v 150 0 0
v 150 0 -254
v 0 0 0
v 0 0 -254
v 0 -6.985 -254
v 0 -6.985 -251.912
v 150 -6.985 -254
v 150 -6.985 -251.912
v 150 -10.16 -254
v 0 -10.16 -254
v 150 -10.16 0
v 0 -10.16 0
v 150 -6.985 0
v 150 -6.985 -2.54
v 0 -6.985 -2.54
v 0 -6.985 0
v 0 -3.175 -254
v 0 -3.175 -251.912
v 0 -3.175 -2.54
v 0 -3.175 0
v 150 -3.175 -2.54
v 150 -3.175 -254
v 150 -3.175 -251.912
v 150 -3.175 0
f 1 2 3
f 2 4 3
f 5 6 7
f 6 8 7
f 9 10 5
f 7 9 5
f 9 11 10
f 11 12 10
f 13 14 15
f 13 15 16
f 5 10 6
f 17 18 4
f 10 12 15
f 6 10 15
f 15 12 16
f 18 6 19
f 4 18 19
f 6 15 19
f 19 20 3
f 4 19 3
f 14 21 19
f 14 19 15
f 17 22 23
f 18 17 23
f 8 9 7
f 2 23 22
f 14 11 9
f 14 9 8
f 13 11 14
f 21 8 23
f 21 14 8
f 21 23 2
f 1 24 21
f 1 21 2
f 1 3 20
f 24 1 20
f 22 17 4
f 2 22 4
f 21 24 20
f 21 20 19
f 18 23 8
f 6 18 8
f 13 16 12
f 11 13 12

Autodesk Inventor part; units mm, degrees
ref_plane "YZ Plane" through (0, 0, 0) normal (1, 0, 0) x (0, 1, 0)
ref_plane "XZ Plane" through (0, 0, 0) normal (0, 1, 0) x (-1, 0, 0)
ref_plane "XY Plane" through (0, 0, 0) normal (0, 0, 1) x (1, 0, 0)
sketch "Sketch1" plane through (0, 0, 0) normal (1, 0, 0) x (0, 1, 0)
  line L0 (0, 0) -> (-10.16, 0)
  line L1 (-10.16, 0) -> (-10.16, -254)
  line L2 (-10.16, -254) -> (0, -254)
  line L3 (0, -254) -> (0, 0)
  dimension "d0" = 254
  dimension "d1" = 10.16
extrude "Extrusion1" add sketch "Sketch1" along normal blind 150
sketch "Sketch2" plane through (150, 0, 0) normal (1, 0, 0) x (0, 0, -1)
  line L0 (0, -3.175) -> (2.54, -3.175)
  line L1 (2.54, -3.175) -> (2.54, -6.985)
  line L2 (2.54, -6.985) -> (0, -6.985)
  line L3 (0, -6.985) -> (0, -3.175)
  line L4 (0, -10.16) -> (254, -10.16) projected
  line L5 (254, 0) -> (0, 0) projected
  line L6 (254, -3.175) -> (251.9121, -3.175)
  line L7 (251.9121, -3.175) -> (251.9121, -6.985)
  line L8 (251.9121, -6.985) -> (254, -6.985)
  line L9 (254, -6.985) -> (254, -3.175)
  dimension "d4" = 10.16
  dimension "d5" = 3.175
  dimension "d6" = 3.81
  dimension "d7" = 2.54
  dimension "d8" = 3.175
  dimension "d9" = 3.81
  dimension "d10" = 2.0879
  dimension "d11" = 251.46
  dimension "d12" = 0
extrude "Extrusion2" cut sketch "Sketch2" against normal blind 150
properties part number "planche2"
